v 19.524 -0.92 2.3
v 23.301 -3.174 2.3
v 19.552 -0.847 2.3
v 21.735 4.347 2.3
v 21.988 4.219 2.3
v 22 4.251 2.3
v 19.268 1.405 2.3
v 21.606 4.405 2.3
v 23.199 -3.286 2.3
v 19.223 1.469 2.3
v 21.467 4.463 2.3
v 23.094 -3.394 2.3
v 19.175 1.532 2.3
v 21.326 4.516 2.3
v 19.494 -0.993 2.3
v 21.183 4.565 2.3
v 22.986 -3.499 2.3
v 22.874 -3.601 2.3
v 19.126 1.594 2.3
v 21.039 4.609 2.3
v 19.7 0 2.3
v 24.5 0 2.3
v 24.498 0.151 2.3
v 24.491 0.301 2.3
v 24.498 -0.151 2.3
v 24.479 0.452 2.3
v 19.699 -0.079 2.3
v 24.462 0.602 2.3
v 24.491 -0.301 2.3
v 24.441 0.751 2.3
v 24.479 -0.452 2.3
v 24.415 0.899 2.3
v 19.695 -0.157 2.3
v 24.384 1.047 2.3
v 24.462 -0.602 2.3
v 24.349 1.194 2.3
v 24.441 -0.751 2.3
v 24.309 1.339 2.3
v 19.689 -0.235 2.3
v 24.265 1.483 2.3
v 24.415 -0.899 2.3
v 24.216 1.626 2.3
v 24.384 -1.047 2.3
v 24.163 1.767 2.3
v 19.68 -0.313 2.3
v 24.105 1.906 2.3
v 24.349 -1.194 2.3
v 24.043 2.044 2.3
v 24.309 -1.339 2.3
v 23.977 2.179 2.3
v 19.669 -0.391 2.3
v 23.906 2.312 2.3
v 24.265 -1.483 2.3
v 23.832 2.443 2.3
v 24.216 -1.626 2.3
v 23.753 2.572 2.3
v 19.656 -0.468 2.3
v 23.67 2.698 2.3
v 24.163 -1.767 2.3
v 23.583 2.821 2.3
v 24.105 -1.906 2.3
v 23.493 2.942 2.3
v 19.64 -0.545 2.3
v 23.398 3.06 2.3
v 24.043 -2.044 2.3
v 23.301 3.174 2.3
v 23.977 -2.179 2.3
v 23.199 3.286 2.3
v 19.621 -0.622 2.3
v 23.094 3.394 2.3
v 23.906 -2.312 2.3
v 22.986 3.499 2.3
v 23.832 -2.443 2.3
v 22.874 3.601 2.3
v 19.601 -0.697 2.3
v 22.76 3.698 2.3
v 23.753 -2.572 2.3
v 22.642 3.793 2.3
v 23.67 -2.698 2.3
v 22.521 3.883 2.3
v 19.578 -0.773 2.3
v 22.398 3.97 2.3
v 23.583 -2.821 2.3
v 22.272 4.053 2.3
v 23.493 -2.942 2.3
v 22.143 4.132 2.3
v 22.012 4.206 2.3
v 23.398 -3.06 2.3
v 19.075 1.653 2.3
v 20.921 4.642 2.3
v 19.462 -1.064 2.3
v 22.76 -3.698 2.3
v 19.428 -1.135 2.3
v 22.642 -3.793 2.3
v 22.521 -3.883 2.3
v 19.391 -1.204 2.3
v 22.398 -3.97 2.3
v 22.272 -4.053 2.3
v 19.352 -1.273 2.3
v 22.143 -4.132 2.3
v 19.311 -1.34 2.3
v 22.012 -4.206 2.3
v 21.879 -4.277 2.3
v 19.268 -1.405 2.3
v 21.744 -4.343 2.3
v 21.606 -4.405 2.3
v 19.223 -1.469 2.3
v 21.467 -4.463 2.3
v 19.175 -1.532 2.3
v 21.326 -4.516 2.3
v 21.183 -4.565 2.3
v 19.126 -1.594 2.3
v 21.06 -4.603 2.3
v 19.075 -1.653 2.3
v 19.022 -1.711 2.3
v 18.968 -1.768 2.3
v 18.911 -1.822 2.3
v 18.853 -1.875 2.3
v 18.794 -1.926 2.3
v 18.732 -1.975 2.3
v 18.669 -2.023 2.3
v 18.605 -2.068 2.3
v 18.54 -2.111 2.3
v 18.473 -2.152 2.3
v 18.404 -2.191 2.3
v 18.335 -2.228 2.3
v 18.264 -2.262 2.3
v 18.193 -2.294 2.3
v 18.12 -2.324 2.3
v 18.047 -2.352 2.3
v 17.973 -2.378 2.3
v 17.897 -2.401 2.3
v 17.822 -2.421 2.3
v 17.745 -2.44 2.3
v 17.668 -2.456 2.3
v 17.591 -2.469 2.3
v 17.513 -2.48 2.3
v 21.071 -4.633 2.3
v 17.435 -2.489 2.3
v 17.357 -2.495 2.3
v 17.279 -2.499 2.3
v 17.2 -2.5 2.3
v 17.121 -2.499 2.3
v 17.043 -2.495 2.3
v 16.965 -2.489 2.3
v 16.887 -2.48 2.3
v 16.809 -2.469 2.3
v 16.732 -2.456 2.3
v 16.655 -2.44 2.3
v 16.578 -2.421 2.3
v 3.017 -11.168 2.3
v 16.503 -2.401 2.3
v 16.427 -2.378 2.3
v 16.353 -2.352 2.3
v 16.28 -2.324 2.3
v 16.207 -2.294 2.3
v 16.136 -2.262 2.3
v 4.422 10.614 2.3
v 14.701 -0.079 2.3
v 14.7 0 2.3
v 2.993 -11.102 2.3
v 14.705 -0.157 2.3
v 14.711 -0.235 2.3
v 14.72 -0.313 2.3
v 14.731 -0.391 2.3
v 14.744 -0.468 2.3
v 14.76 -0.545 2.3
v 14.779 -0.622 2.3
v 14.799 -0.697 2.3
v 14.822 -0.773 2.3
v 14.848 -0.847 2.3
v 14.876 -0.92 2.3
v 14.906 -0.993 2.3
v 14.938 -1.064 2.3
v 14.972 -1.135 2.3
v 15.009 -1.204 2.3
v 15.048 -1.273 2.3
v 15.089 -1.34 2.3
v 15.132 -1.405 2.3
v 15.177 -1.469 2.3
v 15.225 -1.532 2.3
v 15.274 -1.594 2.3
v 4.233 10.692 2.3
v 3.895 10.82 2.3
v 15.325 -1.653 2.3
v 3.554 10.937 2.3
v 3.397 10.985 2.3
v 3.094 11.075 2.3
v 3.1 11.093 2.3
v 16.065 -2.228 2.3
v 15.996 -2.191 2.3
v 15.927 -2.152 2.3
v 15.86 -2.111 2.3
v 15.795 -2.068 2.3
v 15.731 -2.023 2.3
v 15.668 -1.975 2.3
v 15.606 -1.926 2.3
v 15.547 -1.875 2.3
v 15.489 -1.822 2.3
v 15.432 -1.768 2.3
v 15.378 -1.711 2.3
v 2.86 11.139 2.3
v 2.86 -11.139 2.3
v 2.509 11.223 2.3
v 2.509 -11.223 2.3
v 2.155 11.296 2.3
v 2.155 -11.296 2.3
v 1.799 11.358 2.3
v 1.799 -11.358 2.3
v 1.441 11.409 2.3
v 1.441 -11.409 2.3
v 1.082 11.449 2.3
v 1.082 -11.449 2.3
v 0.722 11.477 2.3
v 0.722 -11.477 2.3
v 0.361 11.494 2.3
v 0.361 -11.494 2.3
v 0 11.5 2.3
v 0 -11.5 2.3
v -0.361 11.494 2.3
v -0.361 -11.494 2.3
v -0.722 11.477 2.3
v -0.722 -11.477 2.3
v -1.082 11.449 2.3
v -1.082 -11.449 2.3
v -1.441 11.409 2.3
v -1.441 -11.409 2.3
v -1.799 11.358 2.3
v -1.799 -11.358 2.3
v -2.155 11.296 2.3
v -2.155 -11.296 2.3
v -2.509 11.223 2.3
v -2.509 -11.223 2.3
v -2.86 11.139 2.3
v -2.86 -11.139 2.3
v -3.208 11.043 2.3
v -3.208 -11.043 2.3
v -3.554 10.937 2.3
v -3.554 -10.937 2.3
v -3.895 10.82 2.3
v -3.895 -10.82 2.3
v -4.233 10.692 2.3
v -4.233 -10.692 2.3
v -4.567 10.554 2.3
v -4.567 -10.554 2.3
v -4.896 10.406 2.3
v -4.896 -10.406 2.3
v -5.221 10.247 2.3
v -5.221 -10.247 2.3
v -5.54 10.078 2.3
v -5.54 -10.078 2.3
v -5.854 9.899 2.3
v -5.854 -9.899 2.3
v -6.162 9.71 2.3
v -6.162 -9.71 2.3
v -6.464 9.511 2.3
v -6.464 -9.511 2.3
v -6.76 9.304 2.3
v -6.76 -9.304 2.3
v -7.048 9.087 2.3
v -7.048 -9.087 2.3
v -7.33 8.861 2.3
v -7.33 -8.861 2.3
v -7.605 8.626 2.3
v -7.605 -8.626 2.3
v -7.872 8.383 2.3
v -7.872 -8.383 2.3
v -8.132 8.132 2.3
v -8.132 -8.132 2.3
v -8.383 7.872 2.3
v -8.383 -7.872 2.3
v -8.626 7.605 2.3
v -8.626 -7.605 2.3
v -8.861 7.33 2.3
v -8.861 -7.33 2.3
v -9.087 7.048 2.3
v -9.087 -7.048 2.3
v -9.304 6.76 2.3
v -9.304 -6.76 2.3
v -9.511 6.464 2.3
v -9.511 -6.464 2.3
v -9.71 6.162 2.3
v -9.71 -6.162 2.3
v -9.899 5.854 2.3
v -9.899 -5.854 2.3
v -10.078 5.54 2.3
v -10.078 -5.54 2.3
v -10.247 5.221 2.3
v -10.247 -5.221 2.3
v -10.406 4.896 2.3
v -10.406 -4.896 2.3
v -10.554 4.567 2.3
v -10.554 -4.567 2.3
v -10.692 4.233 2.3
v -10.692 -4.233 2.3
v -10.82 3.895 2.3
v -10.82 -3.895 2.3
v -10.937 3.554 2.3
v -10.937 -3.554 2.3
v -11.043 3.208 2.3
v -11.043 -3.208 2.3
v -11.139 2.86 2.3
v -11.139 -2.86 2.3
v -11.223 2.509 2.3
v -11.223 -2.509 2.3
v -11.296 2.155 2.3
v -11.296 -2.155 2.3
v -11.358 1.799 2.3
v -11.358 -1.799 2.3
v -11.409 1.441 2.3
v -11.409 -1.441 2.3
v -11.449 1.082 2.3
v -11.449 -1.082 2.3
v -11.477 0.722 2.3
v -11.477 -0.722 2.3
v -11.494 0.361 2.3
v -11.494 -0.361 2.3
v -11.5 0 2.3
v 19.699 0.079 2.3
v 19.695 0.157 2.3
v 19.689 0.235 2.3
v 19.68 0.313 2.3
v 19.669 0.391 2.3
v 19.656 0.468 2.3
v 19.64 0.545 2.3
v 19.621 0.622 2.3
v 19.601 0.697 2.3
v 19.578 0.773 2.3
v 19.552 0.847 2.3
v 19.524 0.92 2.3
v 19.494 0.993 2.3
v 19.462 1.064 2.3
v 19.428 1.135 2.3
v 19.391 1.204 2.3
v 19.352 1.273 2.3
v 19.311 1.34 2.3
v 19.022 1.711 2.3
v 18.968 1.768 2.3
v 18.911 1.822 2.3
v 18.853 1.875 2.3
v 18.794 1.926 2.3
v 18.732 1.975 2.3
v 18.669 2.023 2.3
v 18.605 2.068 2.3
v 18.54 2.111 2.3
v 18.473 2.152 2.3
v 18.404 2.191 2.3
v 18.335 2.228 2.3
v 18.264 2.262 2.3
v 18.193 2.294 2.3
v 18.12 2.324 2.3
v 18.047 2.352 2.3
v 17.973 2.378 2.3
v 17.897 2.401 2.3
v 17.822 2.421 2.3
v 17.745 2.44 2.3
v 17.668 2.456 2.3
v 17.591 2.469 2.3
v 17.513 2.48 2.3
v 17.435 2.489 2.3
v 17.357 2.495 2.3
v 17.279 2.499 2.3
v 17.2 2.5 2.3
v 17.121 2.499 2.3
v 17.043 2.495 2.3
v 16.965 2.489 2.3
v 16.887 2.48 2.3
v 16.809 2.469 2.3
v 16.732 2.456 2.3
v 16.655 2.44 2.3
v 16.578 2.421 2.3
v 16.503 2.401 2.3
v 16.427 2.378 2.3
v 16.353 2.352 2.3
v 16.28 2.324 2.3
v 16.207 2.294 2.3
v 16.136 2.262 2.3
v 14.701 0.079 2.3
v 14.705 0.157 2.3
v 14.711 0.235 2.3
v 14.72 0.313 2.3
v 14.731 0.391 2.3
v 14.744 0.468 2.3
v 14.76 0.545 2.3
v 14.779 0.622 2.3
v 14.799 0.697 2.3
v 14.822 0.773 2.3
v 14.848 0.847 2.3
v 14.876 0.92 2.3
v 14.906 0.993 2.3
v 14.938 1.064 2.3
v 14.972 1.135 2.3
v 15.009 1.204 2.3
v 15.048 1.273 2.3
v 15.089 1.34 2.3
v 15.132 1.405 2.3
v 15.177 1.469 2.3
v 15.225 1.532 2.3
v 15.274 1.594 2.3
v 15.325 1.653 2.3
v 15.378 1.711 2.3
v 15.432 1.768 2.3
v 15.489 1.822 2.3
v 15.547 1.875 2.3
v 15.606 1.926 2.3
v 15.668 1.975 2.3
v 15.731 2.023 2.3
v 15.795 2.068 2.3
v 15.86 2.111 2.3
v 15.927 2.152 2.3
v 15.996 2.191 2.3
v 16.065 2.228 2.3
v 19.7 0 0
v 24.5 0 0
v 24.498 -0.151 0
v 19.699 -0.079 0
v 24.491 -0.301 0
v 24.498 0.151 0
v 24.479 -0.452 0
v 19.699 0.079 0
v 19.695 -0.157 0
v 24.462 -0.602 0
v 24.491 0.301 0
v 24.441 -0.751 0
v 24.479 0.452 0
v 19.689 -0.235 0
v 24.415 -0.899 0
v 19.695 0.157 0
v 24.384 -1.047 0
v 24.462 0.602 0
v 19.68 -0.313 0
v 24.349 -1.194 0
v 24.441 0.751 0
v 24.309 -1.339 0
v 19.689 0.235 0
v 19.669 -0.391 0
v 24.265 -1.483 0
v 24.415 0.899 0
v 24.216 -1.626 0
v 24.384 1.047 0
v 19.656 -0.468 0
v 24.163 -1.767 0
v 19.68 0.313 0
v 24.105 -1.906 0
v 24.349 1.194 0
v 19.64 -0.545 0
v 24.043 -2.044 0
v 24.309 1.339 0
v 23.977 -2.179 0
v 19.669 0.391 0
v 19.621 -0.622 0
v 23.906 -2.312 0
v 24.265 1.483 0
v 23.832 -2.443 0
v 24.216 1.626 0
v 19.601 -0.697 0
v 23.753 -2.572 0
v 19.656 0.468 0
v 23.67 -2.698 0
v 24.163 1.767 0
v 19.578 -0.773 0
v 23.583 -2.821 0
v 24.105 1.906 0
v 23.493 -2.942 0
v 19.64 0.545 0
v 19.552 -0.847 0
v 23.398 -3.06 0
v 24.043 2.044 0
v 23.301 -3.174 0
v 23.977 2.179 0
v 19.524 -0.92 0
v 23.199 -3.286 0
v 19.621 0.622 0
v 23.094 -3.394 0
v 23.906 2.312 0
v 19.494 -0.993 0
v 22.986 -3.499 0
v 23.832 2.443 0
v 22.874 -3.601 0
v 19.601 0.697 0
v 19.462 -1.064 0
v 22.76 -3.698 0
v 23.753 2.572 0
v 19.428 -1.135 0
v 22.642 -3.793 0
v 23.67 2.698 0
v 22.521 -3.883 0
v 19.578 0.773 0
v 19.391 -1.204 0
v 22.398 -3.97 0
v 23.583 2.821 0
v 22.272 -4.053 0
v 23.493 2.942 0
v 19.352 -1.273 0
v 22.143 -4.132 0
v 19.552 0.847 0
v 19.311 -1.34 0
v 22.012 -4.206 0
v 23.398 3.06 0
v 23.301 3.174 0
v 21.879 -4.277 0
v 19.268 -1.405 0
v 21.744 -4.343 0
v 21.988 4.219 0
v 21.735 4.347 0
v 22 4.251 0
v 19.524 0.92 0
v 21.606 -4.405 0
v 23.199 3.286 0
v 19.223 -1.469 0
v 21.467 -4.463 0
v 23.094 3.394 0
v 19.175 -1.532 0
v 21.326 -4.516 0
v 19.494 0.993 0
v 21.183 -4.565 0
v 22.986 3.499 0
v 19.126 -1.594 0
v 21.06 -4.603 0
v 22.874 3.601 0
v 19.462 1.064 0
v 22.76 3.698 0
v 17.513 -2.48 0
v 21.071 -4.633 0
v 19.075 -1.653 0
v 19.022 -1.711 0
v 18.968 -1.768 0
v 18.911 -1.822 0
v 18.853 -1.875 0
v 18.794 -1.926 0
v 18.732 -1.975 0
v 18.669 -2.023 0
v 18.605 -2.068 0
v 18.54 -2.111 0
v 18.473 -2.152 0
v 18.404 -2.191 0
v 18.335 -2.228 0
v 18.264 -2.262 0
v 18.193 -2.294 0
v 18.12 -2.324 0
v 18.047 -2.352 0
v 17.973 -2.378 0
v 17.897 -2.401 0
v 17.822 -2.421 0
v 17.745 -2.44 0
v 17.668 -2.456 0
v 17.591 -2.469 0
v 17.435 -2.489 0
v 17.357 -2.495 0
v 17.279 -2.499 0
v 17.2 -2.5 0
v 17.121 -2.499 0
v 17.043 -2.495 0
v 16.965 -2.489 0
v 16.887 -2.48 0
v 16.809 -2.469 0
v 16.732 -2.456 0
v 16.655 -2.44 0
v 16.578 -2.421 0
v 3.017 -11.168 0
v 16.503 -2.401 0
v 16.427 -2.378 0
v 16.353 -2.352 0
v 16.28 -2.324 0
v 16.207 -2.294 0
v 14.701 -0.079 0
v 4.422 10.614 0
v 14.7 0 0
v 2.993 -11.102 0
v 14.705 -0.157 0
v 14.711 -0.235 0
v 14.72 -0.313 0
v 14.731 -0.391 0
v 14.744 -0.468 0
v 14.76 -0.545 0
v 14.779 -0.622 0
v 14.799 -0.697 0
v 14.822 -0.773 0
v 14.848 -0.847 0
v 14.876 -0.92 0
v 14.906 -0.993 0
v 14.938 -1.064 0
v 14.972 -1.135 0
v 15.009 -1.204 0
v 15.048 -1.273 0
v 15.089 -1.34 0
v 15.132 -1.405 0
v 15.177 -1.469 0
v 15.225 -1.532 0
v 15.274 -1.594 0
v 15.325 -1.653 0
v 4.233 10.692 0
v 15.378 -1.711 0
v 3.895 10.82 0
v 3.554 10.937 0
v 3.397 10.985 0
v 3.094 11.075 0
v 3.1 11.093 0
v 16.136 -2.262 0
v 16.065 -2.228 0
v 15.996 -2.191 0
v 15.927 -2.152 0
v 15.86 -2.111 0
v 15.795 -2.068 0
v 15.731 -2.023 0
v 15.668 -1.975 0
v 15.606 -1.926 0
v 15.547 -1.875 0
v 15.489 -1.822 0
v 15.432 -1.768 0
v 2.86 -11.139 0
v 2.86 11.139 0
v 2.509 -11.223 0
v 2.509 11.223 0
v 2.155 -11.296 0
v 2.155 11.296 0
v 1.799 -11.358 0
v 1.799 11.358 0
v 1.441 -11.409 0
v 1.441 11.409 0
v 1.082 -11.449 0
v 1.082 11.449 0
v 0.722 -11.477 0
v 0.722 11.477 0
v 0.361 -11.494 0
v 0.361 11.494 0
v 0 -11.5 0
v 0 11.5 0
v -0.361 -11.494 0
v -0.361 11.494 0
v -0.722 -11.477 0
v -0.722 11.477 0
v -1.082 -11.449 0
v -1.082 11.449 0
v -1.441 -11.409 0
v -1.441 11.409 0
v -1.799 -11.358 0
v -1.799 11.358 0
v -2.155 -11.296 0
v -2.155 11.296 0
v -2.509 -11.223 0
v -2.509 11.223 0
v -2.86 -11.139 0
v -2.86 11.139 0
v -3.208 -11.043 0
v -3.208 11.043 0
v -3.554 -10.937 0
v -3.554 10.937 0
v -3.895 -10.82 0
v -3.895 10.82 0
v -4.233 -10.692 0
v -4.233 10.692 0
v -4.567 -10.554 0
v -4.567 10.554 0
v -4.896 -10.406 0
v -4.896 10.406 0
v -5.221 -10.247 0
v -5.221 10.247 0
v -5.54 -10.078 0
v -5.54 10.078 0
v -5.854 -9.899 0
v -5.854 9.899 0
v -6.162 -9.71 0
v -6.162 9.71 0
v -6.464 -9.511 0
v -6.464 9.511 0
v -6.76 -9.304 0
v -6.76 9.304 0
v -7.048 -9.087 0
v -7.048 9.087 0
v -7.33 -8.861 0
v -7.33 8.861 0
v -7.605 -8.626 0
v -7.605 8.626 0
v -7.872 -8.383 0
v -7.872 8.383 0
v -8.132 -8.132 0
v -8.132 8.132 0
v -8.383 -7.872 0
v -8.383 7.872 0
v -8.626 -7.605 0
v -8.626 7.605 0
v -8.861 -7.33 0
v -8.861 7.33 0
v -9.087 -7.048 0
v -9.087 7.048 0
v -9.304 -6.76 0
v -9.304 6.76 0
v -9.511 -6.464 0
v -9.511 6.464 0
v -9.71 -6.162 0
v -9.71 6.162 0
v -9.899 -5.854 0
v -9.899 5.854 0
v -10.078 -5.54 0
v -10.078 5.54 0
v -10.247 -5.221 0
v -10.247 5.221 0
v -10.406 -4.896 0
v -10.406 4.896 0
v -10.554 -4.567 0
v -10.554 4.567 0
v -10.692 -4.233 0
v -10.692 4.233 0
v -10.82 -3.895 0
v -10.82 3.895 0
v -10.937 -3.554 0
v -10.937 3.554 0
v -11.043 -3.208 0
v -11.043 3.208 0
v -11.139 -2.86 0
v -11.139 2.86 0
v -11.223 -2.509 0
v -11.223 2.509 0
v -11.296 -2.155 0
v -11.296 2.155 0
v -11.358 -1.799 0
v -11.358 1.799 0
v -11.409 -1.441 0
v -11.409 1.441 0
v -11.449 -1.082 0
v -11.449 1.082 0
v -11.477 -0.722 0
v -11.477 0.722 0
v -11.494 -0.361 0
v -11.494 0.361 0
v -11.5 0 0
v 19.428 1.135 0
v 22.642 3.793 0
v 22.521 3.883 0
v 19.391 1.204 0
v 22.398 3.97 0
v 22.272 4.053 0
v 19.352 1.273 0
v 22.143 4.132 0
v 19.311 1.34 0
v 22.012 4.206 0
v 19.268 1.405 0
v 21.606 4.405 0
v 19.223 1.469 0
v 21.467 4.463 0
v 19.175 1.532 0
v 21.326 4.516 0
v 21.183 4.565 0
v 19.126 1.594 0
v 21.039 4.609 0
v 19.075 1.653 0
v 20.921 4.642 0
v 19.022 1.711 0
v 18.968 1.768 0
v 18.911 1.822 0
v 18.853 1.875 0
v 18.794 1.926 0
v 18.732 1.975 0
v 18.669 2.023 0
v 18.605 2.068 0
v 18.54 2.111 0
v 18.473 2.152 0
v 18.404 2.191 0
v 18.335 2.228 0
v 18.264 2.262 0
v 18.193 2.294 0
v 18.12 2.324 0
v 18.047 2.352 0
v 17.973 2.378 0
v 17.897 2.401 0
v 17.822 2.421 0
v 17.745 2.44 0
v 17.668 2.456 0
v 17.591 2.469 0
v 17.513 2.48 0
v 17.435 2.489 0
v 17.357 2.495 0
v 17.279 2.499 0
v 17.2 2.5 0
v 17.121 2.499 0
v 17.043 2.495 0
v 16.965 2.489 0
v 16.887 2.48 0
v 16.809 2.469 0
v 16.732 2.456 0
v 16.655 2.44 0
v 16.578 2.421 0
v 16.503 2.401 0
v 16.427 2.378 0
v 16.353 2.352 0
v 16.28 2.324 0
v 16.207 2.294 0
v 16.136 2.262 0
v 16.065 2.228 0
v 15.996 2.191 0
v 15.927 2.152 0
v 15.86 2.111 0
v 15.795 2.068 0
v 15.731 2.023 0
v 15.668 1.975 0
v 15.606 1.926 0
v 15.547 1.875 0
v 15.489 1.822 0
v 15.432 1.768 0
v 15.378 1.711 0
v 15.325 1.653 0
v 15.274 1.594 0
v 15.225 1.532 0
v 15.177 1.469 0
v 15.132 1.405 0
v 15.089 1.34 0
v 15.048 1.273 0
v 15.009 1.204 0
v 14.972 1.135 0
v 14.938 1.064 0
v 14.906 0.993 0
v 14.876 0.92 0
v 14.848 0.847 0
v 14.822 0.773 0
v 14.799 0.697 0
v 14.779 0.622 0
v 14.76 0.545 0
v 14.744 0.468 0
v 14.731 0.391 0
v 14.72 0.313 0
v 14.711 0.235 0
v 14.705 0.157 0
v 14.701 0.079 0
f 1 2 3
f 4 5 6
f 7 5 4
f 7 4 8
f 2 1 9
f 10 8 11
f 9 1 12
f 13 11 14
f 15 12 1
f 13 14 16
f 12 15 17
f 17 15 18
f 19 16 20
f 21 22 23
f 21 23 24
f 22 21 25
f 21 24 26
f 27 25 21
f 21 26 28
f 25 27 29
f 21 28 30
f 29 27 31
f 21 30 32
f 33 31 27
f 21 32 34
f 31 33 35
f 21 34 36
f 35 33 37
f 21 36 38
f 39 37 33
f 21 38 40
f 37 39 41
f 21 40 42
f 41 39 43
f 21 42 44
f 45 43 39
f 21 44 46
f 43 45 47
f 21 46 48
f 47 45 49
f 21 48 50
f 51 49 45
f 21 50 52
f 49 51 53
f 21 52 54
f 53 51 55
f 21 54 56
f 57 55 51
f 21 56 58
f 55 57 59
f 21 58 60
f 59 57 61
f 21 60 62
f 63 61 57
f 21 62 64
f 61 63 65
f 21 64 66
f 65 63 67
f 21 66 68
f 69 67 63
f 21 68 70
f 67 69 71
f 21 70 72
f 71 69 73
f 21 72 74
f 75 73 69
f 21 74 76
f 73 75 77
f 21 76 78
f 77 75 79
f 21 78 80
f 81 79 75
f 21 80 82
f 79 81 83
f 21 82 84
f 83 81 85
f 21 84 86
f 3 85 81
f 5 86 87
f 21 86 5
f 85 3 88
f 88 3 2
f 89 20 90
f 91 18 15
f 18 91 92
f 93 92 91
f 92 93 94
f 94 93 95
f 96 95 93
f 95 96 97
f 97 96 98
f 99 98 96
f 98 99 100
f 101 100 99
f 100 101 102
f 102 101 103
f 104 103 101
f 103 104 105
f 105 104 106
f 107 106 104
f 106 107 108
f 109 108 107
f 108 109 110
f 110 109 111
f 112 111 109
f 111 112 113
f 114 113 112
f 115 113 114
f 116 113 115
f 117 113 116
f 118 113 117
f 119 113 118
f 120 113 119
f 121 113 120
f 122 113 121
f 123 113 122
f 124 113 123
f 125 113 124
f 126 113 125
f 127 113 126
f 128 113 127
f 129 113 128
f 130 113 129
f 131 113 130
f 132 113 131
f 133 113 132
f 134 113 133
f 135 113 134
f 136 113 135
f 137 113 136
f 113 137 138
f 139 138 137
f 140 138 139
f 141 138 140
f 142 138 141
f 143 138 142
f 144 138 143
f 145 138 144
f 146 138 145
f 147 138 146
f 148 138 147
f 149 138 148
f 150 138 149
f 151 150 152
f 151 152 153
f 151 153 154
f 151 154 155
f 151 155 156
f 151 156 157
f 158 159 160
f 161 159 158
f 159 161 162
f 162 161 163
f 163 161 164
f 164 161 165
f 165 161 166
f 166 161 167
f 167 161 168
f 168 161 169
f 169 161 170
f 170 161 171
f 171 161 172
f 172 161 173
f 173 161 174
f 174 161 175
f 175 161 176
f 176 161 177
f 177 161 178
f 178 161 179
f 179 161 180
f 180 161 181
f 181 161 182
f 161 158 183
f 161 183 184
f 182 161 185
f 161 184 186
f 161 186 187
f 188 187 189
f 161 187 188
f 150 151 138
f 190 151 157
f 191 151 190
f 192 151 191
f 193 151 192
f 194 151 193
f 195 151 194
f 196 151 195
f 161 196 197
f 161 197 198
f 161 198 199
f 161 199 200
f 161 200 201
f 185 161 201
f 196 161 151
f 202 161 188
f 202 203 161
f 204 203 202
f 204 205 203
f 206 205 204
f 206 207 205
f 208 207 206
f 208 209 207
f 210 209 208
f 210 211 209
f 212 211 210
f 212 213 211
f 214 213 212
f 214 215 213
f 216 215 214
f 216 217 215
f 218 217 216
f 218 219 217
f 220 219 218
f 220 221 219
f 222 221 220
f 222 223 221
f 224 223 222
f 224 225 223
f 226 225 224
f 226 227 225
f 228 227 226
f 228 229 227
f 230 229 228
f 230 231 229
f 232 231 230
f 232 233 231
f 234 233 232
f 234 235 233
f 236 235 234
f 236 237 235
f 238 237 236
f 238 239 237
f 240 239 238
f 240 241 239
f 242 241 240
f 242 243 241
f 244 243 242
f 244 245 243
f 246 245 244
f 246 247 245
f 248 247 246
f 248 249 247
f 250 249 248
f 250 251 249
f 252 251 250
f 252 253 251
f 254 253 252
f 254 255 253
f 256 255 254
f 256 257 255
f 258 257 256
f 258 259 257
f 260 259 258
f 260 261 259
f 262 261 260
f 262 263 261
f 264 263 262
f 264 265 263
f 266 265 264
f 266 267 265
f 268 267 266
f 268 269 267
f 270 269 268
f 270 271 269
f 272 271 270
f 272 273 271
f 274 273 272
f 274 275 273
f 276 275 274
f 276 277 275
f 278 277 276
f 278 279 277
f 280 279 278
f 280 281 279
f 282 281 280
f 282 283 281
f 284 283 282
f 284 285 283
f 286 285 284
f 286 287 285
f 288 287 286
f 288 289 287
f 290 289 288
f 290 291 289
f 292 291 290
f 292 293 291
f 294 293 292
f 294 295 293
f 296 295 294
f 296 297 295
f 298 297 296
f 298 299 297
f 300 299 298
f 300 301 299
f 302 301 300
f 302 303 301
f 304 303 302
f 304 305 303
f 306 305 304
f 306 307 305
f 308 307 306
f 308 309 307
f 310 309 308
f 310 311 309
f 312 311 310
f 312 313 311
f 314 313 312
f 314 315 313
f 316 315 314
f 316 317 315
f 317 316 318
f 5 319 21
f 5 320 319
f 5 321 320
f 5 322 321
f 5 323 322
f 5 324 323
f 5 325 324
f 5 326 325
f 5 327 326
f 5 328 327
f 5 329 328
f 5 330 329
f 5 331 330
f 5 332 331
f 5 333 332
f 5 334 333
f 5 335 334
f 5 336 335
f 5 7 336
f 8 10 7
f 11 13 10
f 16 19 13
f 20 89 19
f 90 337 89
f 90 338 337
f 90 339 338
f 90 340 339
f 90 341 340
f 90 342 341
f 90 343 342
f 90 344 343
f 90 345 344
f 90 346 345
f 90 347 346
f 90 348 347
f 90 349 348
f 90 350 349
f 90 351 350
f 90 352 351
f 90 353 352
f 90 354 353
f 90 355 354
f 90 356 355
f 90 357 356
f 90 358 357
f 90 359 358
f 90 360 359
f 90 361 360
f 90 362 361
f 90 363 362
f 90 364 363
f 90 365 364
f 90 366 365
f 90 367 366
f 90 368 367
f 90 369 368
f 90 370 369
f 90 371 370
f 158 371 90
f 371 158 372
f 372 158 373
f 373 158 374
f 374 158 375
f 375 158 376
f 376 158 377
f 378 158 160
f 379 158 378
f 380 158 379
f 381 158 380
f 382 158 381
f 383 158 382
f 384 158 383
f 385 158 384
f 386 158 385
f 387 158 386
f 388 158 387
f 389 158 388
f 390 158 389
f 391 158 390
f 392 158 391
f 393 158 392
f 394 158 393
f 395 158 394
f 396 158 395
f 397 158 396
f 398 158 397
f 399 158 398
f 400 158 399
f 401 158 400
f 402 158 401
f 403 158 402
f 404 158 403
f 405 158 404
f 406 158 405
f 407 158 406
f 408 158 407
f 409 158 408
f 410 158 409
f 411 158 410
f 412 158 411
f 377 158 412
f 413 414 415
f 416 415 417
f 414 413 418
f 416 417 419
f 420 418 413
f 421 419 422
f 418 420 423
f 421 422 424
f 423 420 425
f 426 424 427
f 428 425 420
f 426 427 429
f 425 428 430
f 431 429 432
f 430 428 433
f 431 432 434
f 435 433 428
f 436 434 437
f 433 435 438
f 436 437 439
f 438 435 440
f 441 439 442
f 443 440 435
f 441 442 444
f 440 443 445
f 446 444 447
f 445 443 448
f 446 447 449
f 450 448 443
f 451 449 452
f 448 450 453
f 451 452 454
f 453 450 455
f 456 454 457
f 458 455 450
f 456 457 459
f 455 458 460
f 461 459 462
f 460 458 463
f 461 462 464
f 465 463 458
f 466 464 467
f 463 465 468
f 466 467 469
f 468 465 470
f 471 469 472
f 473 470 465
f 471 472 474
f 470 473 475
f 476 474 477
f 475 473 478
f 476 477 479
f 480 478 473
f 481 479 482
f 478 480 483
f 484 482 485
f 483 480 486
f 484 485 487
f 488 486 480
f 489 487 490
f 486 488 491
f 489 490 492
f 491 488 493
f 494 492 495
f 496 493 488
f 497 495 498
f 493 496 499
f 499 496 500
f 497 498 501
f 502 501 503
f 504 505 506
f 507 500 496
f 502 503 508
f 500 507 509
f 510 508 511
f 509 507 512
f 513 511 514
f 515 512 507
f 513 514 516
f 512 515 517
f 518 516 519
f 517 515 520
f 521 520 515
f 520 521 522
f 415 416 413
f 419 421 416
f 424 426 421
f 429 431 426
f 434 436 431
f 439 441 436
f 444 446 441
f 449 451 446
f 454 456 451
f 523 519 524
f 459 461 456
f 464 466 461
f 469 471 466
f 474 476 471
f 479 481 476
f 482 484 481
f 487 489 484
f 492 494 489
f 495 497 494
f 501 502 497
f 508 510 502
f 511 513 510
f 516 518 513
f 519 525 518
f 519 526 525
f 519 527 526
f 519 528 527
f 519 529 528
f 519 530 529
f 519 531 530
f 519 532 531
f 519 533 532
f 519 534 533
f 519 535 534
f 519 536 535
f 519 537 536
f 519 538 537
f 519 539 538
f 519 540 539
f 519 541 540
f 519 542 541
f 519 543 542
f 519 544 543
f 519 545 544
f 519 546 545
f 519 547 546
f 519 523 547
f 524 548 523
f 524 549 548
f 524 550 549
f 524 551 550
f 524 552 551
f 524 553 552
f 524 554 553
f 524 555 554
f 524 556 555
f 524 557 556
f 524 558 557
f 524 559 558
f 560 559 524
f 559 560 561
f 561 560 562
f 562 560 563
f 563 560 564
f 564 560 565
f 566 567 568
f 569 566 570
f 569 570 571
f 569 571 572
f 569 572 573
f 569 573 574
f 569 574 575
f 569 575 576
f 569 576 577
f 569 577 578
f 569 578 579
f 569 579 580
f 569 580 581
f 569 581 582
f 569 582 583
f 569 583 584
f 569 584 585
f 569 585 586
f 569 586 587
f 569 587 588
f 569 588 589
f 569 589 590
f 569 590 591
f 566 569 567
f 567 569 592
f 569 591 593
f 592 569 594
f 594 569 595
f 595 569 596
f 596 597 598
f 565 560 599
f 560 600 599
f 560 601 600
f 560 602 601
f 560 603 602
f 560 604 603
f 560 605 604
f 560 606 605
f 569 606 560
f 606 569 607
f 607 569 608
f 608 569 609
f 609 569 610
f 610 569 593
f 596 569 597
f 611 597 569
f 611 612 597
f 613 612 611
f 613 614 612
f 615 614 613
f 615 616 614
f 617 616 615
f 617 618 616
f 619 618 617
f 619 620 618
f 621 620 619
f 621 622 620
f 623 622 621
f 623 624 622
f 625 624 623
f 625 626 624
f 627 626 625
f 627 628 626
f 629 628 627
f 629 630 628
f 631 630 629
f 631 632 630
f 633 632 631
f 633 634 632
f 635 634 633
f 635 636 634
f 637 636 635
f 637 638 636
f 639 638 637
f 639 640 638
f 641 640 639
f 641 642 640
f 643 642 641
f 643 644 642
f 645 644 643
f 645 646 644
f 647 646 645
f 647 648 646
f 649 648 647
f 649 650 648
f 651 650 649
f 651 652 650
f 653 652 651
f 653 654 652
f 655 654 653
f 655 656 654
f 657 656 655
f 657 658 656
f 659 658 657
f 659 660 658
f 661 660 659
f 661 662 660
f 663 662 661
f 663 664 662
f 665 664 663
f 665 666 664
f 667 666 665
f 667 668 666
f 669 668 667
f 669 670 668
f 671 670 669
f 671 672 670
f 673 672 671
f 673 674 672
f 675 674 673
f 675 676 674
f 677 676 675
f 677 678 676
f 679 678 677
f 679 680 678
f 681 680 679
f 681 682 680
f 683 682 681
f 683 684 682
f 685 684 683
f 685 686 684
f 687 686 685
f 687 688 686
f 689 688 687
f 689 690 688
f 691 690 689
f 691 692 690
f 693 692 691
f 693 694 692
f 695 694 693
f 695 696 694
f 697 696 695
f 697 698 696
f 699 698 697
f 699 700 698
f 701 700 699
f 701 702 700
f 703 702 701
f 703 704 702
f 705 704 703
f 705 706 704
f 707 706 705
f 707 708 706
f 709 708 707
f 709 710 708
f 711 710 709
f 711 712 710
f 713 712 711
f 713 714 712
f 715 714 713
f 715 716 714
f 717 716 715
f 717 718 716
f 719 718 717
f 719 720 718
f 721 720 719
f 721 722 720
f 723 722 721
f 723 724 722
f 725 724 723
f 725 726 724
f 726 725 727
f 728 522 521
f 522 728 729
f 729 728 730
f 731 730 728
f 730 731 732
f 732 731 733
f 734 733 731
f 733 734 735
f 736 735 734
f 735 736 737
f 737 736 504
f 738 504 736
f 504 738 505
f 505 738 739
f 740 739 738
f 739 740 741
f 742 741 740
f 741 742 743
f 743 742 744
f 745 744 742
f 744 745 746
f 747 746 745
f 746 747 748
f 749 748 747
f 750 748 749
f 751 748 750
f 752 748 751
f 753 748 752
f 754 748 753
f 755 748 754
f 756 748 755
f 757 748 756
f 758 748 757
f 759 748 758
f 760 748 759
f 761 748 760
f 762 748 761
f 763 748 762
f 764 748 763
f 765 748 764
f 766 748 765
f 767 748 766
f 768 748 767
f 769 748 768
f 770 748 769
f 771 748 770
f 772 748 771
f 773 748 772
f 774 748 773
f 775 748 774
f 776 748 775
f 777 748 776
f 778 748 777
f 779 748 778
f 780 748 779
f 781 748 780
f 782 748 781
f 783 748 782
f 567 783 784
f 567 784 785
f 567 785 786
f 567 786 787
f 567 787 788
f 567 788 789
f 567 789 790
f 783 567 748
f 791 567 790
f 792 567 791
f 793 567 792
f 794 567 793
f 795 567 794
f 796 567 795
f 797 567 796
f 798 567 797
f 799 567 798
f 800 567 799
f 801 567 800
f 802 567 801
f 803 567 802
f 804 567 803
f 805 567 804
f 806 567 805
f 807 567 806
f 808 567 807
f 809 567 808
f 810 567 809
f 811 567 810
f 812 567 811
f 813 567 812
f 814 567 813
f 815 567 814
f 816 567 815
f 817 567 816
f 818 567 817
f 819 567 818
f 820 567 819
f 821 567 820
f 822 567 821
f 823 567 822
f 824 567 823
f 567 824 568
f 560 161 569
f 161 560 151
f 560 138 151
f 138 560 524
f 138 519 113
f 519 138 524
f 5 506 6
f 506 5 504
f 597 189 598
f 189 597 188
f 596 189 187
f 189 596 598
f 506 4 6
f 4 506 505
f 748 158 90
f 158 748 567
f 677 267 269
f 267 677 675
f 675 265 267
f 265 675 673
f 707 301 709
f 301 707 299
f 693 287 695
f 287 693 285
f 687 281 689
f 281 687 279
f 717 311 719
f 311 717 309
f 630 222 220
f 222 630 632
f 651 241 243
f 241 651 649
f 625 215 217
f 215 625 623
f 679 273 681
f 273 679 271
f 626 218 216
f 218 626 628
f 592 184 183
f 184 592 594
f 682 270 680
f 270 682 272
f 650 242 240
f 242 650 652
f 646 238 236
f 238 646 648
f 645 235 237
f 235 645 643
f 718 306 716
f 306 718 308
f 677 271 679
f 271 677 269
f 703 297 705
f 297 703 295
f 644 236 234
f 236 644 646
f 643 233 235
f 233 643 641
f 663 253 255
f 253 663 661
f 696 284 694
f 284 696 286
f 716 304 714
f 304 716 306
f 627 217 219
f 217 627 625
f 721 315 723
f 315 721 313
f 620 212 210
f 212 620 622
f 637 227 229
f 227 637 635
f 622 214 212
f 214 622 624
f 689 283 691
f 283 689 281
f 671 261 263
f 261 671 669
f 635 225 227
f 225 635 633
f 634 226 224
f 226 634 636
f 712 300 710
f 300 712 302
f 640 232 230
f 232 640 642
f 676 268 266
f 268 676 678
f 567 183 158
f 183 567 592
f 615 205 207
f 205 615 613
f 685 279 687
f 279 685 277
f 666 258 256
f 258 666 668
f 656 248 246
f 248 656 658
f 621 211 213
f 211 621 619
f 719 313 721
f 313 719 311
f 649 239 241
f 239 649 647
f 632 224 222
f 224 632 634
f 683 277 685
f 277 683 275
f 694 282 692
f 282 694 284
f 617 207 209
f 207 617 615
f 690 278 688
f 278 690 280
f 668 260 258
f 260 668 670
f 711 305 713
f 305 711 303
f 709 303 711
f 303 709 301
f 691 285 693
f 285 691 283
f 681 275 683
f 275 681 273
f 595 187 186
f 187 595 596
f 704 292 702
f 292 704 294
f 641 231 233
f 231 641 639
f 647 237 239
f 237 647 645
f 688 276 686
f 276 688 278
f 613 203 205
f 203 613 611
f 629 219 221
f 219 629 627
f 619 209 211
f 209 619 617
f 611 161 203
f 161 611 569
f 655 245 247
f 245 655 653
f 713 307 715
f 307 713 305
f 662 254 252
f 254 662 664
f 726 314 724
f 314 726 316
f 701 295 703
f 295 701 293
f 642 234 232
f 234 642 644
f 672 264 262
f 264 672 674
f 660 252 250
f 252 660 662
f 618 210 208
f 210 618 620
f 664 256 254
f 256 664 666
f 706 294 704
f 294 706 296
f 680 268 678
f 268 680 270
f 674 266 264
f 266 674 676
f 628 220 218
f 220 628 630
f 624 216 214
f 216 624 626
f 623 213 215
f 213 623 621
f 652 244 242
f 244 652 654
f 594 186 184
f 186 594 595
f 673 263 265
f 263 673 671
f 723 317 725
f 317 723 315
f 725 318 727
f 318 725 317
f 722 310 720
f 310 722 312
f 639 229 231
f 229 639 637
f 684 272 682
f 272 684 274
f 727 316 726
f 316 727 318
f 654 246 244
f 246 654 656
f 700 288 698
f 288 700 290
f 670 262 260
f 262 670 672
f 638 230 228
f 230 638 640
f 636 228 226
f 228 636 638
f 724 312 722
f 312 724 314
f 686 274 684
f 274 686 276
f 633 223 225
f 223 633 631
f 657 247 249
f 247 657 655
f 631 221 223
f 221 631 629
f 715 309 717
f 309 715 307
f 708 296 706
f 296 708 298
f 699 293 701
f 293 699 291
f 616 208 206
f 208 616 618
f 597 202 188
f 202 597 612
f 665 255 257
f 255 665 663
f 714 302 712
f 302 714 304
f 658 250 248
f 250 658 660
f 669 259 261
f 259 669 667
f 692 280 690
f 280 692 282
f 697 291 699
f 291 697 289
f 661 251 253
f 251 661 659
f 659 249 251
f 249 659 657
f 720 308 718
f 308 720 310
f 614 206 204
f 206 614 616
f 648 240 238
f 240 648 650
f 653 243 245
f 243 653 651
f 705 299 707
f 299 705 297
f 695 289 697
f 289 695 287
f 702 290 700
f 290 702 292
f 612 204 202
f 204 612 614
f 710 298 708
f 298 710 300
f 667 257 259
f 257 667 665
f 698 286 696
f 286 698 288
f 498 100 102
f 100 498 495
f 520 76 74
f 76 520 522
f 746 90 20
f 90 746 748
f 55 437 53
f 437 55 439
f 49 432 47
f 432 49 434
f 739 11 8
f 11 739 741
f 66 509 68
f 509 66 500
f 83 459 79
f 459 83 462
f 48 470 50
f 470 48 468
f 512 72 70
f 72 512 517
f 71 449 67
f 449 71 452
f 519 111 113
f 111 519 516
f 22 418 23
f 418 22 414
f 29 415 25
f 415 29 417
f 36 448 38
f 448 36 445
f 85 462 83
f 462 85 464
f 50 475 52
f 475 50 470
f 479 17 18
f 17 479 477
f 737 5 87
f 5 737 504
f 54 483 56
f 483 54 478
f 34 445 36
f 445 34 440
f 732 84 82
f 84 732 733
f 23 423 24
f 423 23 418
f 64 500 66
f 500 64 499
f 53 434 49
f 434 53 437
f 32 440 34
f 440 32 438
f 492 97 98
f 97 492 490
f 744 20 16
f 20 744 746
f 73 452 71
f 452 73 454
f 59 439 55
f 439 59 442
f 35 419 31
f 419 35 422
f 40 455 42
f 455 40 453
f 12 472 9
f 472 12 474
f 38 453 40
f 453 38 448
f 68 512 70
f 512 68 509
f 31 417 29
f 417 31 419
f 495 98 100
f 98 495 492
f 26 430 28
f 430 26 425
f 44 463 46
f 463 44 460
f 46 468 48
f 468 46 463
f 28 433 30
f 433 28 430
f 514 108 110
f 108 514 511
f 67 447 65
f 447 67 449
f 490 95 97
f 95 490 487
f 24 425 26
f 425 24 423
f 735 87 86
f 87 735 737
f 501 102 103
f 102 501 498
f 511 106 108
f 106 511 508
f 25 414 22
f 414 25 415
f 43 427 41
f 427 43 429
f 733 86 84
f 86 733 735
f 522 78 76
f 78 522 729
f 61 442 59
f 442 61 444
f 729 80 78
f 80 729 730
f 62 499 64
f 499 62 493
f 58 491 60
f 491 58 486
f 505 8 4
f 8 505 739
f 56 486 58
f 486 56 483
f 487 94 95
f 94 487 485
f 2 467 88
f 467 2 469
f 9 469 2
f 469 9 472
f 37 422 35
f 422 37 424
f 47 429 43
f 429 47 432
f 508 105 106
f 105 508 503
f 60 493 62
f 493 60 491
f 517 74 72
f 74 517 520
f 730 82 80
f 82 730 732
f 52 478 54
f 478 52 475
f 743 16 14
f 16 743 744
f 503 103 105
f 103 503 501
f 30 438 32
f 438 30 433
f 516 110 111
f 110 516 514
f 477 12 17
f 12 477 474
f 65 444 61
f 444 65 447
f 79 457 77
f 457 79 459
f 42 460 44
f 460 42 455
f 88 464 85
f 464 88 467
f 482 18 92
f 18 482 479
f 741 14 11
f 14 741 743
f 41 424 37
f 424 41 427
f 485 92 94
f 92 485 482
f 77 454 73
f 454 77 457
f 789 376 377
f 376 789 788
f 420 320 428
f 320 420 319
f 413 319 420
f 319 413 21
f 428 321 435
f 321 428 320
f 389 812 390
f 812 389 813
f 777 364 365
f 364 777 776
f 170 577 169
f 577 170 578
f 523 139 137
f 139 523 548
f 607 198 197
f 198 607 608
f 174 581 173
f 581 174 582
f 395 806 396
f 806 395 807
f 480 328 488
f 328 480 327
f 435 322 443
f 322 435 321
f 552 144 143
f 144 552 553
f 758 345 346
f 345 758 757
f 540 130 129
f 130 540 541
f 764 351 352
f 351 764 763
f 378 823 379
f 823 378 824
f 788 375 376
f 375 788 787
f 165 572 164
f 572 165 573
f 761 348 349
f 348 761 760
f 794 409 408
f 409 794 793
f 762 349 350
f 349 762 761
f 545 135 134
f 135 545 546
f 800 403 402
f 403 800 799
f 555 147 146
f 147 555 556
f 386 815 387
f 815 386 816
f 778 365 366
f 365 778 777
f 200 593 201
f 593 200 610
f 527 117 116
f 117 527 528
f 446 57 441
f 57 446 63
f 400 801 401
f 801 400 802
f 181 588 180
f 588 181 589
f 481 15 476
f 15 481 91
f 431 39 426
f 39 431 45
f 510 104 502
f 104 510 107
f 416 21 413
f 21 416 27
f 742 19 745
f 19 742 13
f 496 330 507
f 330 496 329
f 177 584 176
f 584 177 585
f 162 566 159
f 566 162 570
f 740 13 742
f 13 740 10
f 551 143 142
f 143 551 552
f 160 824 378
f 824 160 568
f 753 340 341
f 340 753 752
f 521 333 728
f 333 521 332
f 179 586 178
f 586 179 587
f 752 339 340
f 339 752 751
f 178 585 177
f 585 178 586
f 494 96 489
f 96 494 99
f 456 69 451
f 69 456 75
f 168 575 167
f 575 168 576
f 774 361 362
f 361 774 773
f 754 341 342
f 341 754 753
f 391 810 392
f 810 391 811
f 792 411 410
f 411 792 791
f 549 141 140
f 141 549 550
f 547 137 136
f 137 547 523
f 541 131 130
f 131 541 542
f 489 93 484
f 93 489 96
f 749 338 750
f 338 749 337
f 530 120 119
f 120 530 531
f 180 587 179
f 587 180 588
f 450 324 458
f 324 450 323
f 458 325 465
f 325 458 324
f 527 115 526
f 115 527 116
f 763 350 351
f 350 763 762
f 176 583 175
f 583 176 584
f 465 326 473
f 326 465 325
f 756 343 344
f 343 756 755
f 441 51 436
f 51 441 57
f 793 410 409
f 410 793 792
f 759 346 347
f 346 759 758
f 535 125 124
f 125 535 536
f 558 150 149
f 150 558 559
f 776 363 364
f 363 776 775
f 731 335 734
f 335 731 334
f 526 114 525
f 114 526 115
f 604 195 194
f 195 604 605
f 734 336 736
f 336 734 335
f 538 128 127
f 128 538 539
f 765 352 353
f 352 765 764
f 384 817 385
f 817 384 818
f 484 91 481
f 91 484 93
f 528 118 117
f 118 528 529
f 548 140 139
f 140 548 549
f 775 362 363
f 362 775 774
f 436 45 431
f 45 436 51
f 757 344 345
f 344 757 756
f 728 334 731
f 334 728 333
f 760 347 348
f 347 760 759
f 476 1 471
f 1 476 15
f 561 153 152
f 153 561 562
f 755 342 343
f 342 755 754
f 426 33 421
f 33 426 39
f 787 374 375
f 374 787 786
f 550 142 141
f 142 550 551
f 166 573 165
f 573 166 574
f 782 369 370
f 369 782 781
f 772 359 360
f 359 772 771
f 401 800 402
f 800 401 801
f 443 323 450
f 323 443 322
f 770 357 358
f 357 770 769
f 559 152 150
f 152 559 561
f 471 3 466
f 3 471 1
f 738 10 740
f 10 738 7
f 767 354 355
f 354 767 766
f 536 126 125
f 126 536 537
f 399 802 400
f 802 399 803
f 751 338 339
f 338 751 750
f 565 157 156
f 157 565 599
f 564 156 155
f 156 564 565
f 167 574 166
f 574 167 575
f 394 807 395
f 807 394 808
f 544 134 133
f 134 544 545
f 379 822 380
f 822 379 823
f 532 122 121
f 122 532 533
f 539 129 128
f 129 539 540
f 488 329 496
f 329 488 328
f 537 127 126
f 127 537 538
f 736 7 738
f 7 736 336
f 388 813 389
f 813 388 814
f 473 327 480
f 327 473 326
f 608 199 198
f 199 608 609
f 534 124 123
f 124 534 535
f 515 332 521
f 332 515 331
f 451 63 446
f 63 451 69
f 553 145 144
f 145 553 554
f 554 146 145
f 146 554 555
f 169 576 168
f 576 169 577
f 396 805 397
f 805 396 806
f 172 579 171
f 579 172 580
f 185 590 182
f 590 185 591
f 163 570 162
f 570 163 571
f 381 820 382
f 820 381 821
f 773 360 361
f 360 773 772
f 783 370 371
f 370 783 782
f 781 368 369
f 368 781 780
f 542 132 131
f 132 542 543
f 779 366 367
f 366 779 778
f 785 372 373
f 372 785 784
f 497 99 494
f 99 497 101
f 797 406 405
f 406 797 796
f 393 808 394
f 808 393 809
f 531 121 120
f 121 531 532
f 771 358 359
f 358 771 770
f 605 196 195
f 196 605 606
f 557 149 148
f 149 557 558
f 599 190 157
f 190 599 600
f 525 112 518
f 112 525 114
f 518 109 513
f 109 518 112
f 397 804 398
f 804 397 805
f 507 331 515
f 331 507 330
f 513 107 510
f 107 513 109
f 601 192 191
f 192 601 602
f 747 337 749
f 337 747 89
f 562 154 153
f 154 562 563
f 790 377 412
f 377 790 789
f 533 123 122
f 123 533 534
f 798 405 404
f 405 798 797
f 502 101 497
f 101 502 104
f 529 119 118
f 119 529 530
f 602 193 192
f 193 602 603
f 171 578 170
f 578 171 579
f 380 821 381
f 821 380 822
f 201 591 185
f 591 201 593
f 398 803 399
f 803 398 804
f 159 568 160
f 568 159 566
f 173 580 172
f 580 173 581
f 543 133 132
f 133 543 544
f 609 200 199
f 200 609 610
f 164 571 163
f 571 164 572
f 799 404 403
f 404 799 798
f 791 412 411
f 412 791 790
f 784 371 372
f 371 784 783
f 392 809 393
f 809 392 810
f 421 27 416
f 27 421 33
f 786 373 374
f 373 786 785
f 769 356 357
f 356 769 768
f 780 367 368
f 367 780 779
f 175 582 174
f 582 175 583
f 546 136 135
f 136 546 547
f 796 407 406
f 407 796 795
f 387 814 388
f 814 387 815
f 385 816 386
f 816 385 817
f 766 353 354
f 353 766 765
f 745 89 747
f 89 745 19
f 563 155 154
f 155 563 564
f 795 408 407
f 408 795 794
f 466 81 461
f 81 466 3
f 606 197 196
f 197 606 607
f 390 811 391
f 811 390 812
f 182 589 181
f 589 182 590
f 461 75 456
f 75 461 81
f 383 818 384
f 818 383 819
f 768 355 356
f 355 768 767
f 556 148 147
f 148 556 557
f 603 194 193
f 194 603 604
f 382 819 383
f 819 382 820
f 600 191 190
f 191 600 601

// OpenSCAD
/*
 * Shopping cart coin - key chain
 * (c) 2020 David Mikulik
 * Licensed under 
 * Creative Commons 
 * Attribution Non Comercial Share alike license
 */
 
 THIKNES=2.3;
 DIAMETER= 23;
 SIZE = 36;
 HOLE = 5;
 IMAGE = "smile.png";
 $fn=200;
 
 minkowski () 
 {
 difference () {
         union () {
         cylinder (d=DIAMETER,h=THIKNES);
         translate ([-THIKNES,-HOLE,0]) {
            cube  ([SIZE-HOLE/2-DIAMETER/2, HOLE+2*THIKNES, THIKNES]);
            rotate([0,0,19.9])
                translate ([2.9,-DIAMETER+15.39,0])
                cube  ([SIZE-HOLE/2-DIAMETER/2-2.8, HOLE+2*THIKNES, THIKNES]);
            rotate([0,0,-19.9])
                translate ([-0.4,DIAMETER-15.63,0])
                cube  ([SIZE-HOLE/2-DIAMETER/2-1.9, HOLE+2*THIKNES, THIKNES]);
         }
         translate ([SIZE-DIAMETER/2-(HOLE/2+THIKNES),0,0]) {
            cylinder (d=HOLE+2*THIKNES,h=THIKNES);
            
         }
     }
     translate ([SIZE-DIAMETER/2-(HOLE/2+HOLE/2+THIKNES),0,0])
        cylinder (d=HOLE,h=THIKNES);
     translate ([10,-13.5,THIKNES/2])
        rotate ([0,0,90])
            scale([.09,.09,.03])
                surface(file=IMAGE,invert=true);
 }
 }
